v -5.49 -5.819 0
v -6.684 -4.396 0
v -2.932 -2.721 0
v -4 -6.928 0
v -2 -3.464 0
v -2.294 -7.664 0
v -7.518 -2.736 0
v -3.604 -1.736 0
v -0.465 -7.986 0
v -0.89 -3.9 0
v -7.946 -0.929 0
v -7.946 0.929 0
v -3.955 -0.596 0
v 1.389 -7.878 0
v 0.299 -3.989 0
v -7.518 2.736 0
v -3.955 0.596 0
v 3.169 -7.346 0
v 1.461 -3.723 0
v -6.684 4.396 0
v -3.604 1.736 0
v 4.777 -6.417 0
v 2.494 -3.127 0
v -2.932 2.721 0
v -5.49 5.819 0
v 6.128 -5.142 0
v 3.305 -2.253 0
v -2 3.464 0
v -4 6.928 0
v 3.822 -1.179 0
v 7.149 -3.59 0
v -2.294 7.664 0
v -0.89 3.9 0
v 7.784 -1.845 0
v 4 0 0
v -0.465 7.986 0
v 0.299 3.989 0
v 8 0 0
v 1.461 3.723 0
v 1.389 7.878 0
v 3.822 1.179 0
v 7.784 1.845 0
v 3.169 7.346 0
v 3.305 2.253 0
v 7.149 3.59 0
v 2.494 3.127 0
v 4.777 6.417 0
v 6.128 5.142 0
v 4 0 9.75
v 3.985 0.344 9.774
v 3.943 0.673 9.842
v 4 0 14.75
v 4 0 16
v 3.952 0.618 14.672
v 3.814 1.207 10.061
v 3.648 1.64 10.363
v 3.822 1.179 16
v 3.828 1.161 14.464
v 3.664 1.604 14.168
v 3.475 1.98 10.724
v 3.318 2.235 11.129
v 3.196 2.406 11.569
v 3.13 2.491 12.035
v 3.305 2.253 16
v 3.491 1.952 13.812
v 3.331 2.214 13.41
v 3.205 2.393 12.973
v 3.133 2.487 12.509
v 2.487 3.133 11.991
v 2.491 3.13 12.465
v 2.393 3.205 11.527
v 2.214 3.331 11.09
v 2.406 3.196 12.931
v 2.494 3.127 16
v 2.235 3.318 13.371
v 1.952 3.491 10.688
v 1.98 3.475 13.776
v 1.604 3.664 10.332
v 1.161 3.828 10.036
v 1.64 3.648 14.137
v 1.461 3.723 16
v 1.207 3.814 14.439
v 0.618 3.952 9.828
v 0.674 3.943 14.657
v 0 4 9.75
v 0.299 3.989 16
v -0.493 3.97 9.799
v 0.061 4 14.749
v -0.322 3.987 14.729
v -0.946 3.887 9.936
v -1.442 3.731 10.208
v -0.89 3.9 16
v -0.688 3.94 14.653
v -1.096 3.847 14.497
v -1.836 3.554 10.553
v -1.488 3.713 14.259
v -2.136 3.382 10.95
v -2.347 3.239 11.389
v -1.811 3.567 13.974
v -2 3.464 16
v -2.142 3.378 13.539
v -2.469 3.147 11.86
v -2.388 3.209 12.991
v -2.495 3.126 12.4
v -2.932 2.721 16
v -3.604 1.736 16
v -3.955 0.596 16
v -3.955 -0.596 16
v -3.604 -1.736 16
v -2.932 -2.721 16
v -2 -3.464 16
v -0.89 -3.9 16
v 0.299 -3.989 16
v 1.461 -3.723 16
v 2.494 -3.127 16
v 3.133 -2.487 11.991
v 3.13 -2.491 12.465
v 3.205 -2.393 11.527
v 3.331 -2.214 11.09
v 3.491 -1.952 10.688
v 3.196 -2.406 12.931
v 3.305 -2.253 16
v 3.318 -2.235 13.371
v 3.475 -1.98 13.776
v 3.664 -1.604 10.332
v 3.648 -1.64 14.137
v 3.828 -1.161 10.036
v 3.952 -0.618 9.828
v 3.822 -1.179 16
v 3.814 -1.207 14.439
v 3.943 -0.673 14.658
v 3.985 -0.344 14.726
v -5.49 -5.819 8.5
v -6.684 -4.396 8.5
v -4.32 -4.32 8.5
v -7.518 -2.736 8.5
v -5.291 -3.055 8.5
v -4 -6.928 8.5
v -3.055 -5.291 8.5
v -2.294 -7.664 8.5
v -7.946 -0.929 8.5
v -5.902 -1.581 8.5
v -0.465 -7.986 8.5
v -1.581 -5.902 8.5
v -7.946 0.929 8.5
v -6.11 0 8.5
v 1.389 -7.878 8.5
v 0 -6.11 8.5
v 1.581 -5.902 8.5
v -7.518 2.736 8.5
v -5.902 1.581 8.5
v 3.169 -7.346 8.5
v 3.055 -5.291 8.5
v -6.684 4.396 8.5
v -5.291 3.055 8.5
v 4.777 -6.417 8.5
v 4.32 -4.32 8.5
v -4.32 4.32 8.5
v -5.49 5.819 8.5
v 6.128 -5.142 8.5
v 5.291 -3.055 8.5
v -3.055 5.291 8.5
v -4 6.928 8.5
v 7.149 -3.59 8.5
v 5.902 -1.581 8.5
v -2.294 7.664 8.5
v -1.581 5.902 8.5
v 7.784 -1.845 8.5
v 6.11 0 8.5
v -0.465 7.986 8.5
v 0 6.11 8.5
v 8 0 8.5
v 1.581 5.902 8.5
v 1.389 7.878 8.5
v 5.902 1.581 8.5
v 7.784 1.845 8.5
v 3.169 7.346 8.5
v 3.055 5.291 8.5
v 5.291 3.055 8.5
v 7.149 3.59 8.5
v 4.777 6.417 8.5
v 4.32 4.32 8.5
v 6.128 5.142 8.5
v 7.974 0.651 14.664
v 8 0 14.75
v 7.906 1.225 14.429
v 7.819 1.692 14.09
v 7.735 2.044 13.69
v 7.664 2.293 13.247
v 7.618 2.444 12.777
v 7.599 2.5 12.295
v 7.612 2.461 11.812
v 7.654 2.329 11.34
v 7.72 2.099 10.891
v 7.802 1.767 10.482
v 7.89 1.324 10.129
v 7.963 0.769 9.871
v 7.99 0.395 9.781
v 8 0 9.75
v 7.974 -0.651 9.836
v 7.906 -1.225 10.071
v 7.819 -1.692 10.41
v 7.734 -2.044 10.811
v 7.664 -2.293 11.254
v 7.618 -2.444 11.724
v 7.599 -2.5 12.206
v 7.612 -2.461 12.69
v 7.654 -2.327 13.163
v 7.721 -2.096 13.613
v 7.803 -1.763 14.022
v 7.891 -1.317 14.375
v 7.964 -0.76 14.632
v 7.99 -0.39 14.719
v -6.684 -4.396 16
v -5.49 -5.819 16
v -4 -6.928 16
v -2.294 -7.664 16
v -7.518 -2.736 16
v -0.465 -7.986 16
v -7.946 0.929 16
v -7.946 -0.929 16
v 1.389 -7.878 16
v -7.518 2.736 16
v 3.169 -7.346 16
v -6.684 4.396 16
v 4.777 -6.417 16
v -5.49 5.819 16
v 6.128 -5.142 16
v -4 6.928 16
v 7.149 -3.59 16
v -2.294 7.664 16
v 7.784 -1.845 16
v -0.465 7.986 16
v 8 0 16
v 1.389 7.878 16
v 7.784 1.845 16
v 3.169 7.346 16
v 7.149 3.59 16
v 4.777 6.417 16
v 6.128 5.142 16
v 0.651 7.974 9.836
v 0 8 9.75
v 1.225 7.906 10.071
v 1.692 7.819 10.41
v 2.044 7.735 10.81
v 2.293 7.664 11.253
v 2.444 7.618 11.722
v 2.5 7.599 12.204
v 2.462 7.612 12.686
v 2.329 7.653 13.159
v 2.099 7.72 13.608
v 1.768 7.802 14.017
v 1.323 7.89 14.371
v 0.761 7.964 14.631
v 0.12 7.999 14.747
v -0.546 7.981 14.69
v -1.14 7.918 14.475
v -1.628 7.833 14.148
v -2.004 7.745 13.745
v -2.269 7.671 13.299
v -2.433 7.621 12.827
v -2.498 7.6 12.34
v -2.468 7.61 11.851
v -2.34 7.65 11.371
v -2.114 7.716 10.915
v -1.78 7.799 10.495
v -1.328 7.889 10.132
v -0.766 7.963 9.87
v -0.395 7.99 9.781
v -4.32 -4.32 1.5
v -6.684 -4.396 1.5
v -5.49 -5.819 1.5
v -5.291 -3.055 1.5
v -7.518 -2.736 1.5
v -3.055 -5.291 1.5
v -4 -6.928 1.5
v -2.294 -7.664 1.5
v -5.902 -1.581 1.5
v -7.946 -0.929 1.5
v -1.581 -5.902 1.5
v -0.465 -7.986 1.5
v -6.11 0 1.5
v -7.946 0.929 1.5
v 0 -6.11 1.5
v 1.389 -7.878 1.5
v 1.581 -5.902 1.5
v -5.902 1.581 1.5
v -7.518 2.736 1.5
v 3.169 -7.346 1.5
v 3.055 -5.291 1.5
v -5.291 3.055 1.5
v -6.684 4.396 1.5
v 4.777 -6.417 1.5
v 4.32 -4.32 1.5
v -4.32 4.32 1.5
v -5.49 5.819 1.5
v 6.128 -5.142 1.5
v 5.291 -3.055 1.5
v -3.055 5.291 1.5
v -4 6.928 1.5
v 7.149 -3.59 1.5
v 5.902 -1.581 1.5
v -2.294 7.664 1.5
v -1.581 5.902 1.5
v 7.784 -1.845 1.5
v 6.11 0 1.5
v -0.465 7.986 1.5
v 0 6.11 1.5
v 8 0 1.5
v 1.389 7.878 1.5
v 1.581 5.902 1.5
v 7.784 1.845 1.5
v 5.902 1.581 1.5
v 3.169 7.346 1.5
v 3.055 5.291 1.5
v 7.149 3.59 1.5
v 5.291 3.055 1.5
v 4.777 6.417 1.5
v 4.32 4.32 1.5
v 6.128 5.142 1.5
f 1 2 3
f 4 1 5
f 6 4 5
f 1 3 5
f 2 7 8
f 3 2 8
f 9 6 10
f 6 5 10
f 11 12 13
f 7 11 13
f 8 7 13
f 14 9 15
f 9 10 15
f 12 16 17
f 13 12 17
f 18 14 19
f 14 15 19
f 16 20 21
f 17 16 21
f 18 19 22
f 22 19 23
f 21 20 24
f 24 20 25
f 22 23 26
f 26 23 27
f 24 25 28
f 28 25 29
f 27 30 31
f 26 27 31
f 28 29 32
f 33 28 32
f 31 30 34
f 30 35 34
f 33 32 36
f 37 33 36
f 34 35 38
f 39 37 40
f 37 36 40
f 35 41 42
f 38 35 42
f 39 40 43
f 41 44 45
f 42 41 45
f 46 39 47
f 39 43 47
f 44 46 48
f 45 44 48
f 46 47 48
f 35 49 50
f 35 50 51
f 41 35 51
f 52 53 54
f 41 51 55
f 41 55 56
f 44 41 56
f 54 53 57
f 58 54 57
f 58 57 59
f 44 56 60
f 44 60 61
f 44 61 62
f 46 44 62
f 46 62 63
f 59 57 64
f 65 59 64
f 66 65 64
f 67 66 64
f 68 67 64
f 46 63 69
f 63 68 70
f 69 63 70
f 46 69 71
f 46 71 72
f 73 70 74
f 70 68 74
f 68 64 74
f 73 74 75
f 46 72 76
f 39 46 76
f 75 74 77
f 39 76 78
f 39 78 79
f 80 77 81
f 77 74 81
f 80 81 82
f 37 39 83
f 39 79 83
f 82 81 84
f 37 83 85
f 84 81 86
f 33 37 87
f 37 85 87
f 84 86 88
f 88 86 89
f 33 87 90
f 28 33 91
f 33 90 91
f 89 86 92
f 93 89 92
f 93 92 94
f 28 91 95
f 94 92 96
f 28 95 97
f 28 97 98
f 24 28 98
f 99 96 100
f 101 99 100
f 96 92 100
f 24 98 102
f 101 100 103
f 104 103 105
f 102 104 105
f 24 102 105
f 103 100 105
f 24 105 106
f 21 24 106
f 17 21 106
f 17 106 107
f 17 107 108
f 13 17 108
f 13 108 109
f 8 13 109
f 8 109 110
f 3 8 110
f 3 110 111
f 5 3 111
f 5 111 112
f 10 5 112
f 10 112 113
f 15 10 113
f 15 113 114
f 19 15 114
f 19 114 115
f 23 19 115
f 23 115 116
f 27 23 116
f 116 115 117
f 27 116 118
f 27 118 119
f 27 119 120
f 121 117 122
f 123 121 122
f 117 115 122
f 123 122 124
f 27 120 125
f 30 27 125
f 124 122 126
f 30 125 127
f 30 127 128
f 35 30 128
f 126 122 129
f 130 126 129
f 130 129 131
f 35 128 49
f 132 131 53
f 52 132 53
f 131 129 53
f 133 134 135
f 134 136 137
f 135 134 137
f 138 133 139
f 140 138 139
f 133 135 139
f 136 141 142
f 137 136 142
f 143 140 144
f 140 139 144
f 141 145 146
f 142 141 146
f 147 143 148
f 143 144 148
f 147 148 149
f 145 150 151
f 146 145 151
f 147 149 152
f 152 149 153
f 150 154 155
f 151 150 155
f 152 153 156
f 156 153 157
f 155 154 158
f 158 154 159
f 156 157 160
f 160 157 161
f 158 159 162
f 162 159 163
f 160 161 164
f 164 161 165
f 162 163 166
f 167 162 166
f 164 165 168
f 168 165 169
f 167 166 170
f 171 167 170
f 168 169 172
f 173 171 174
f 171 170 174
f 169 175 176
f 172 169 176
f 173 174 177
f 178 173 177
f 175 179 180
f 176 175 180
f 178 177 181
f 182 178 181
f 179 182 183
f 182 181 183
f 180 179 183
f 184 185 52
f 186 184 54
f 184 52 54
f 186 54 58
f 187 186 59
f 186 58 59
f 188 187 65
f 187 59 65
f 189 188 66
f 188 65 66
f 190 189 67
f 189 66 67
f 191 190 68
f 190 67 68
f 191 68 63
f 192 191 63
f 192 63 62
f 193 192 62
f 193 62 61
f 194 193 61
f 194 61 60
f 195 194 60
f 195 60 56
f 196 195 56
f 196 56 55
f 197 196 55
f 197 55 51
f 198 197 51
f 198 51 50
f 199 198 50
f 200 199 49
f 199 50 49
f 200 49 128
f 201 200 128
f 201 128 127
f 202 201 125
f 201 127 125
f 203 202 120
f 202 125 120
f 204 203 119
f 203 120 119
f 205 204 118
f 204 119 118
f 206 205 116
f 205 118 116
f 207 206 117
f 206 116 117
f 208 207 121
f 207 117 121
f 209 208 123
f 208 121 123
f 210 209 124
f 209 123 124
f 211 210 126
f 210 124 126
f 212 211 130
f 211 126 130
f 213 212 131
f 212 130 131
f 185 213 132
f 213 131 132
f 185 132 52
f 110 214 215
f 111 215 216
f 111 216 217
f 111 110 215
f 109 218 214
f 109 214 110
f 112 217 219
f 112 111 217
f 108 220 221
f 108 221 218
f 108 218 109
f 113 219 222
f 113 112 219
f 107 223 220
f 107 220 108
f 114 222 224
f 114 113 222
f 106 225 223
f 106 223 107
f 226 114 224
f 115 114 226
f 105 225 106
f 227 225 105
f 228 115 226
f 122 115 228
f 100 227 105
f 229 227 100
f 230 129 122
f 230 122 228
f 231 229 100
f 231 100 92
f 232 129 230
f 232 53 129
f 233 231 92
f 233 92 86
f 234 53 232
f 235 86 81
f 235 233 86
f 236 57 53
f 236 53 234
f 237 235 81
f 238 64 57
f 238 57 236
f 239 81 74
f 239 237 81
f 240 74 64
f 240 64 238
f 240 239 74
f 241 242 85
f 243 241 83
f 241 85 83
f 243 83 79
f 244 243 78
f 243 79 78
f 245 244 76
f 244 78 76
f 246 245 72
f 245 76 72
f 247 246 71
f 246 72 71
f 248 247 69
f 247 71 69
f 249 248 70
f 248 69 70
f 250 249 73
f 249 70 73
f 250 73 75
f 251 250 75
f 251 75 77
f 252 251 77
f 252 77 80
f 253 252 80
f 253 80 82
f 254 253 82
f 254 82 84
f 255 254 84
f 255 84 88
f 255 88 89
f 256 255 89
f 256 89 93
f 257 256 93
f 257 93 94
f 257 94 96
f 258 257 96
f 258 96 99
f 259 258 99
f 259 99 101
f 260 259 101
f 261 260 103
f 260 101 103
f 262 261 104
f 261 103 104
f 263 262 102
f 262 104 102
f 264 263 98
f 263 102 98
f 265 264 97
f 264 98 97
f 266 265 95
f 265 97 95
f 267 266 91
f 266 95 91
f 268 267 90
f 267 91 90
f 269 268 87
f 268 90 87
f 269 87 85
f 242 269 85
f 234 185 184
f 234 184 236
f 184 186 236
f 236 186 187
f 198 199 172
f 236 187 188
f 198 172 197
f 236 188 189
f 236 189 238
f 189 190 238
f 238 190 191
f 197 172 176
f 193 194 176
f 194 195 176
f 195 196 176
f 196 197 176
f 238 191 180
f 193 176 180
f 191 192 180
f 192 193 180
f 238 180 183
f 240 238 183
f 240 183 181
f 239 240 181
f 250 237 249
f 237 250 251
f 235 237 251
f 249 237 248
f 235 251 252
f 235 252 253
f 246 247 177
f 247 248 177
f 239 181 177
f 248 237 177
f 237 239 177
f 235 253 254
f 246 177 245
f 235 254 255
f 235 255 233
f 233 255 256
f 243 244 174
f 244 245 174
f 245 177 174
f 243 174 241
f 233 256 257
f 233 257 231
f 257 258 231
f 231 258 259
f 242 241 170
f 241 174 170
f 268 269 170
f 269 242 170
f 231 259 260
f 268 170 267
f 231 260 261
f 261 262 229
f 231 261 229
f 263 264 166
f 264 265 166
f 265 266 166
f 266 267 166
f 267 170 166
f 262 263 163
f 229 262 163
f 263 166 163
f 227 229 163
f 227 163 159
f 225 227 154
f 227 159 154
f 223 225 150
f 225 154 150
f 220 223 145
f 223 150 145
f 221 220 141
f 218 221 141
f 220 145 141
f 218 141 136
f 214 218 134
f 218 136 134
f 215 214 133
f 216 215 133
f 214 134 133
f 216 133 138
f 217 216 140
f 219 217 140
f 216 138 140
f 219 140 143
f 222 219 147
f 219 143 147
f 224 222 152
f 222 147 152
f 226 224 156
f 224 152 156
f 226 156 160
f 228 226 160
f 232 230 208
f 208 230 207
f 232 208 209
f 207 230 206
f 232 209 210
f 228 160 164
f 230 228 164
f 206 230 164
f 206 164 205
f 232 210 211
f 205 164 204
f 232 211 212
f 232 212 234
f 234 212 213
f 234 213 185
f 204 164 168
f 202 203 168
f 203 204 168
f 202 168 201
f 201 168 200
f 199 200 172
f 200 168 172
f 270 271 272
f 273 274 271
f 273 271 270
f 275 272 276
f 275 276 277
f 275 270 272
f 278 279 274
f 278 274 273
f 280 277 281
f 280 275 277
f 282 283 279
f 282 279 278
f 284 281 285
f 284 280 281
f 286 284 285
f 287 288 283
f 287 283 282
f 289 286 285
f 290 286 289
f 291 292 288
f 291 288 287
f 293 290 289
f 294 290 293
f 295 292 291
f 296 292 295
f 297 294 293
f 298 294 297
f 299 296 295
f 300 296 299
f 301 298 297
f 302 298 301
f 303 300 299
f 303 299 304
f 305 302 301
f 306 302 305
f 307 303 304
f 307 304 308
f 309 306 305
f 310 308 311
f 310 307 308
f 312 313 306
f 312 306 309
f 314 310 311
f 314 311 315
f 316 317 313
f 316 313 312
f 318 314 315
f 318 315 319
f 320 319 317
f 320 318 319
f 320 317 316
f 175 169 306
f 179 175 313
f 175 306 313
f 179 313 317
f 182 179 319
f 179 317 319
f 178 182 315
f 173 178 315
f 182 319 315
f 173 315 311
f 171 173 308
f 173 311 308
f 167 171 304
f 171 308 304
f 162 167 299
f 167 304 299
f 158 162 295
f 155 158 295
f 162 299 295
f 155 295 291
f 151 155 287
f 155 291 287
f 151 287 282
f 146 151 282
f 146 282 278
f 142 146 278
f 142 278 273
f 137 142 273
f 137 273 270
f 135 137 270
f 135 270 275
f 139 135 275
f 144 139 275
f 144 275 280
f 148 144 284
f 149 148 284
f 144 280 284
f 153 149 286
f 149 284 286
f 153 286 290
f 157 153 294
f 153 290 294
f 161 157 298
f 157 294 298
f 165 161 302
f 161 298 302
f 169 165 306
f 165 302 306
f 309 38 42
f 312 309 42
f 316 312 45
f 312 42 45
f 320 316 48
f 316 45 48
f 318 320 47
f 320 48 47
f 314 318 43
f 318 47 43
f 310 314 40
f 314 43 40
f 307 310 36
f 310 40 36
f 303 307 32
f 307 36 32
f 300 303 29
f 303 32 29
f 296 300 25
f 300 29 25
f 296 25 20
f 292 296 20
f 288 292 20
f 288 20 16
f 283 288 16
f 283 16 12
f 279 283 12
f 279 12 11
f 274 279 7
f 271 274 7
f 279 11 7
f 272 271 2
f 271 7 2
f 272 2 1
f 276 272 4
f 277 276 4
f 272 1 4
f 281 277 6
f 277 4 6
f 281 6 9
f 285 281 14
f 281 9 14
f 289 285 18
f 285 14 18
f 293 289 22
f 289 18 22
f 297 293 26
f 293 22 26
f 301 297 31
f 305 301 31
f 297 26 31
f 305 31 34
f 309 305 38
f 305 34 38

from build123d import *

# Parameters (mm, degrees)
SKETCH1_R               = 8
BOSS_EXTRUDE1_DEPTH     = 1.5
SKETCH2_R               = 6.11
BOSS_EXTRUDE2_DEPTH     = 7
SKETCH4_R               = 8
BOSS_EXTRUDE4_DEPTH     = 7.5
SKETCH6_R               = 4
CUT_EXTRUDE1_DEPTH      = 16
CUT_EXTRUDE2_REACH      = 21.596
CUT_EXTRUDE2_END_RADIUS = 8
SKETCH7_R               = 2.5
CUT_EXTRUDE3_REACH      = 21.596
CUT_EXTRUDE3_END_RADIUS = 8
SKETCH8_R               = 2.5


with BuildPart() as part:
    # Sketch1 → Boss-Extrude1 (new body)
    with BuildSketch(Plane.XY):
        Circle(SKETCH1_R)
    extrude(amount=BOSS_EXTRUDE1_DEPTH)

    # Sketch2 → Boss-Extrude2 (add)
    with BuildSketch(Plane.XY.offset(1.5)):
        Circle(SKETCH2_R)
    extrude(amount=BOSS_EXTRUDE2_DEPTH)

    # Sketch4 → Boss-Extrude4 (add)
    with BuildSketch(Plane.XY.offset(8.5)):
        Circle(SKETCH4_R)
    extrude(amount=BOSS_EXTRUDE4_DEPTH)

    # Sketch6 → Cut-Extrude1 (cut)
    with BuildSketch(Plane.XY.offset(16)):
        Circle(SKETCH6_R)
    extrude(amount=-CUT_EXTRUDE1_DEPTH, mode=Mode.SUBTRACT)

    # Cut-Extrude2: up to this cylinder (the profile starts inside it)
    cut_extrude2_end = Plane(origin=(0, 0, 12.25), z_dir=(0, 0, -1)) * Cylinder(CUT_EXTRUDE2_END_RADIUS, 60.192, mode=Mode.PRIVATE)
    # Sketch7 → Cut-Extrude2 (cut, up to the surface)
    with BuildSketch(Plane.ZY, mode=Mode.PRIVATE) as cut_extrude2_sk1:
        with Locations((12.25, 0)):
            Circle(SKETCH7_R)
    cut_extrude2_tool1 = extrude(cut_extrude2_sk1.sketch, amount=-CUT_EXTRUDE2_REACH, mode=Mode.PRIVATE) & cut_extrude2_end
    add(cut_extrude2_tool1.solids().sort_by_distance((0, 0, 12.25))[0], mode=Mode.SUBTRACT)

    # Cut-Extrude3: up to this cylinder (the profile starts inside it)
    cut_extrude3_end = Plane(origin=(0, 0, 12.25), z_dir=(0, 0, -1)) * Cylinder(CUT_EXTRUDE3_END_RADIUS, 60.192, mode=Mode.PRIVATE)
    # Sketch8 → Cut-Extrude3 (cut, up to the surface)
    with BuildSketch(Plane(origin=(0, 0, 0), x_dir=(0, 0, 1), z_dir=(0, -1, 0)), mode=Mode.PRIVATE) as cut_extrude3_sk1:
        with Locations(Location((12.25, 0, 0), (0, 0, 180))):
            Circle(SKETCH8_R)
    cut_extrude3_tool1 = extrude(cut_extrude3_sk1.sketch, amount=-CUT_EXTRUDE3_REACH, mode=Mode.PRIVATE) & cut_extrude3_end
    add(cut_extrude3_tool1.solids().sort_by_distance((0, 0, 12.25))[0], mode=Mode.SUBTRACT)


solid = part.part
